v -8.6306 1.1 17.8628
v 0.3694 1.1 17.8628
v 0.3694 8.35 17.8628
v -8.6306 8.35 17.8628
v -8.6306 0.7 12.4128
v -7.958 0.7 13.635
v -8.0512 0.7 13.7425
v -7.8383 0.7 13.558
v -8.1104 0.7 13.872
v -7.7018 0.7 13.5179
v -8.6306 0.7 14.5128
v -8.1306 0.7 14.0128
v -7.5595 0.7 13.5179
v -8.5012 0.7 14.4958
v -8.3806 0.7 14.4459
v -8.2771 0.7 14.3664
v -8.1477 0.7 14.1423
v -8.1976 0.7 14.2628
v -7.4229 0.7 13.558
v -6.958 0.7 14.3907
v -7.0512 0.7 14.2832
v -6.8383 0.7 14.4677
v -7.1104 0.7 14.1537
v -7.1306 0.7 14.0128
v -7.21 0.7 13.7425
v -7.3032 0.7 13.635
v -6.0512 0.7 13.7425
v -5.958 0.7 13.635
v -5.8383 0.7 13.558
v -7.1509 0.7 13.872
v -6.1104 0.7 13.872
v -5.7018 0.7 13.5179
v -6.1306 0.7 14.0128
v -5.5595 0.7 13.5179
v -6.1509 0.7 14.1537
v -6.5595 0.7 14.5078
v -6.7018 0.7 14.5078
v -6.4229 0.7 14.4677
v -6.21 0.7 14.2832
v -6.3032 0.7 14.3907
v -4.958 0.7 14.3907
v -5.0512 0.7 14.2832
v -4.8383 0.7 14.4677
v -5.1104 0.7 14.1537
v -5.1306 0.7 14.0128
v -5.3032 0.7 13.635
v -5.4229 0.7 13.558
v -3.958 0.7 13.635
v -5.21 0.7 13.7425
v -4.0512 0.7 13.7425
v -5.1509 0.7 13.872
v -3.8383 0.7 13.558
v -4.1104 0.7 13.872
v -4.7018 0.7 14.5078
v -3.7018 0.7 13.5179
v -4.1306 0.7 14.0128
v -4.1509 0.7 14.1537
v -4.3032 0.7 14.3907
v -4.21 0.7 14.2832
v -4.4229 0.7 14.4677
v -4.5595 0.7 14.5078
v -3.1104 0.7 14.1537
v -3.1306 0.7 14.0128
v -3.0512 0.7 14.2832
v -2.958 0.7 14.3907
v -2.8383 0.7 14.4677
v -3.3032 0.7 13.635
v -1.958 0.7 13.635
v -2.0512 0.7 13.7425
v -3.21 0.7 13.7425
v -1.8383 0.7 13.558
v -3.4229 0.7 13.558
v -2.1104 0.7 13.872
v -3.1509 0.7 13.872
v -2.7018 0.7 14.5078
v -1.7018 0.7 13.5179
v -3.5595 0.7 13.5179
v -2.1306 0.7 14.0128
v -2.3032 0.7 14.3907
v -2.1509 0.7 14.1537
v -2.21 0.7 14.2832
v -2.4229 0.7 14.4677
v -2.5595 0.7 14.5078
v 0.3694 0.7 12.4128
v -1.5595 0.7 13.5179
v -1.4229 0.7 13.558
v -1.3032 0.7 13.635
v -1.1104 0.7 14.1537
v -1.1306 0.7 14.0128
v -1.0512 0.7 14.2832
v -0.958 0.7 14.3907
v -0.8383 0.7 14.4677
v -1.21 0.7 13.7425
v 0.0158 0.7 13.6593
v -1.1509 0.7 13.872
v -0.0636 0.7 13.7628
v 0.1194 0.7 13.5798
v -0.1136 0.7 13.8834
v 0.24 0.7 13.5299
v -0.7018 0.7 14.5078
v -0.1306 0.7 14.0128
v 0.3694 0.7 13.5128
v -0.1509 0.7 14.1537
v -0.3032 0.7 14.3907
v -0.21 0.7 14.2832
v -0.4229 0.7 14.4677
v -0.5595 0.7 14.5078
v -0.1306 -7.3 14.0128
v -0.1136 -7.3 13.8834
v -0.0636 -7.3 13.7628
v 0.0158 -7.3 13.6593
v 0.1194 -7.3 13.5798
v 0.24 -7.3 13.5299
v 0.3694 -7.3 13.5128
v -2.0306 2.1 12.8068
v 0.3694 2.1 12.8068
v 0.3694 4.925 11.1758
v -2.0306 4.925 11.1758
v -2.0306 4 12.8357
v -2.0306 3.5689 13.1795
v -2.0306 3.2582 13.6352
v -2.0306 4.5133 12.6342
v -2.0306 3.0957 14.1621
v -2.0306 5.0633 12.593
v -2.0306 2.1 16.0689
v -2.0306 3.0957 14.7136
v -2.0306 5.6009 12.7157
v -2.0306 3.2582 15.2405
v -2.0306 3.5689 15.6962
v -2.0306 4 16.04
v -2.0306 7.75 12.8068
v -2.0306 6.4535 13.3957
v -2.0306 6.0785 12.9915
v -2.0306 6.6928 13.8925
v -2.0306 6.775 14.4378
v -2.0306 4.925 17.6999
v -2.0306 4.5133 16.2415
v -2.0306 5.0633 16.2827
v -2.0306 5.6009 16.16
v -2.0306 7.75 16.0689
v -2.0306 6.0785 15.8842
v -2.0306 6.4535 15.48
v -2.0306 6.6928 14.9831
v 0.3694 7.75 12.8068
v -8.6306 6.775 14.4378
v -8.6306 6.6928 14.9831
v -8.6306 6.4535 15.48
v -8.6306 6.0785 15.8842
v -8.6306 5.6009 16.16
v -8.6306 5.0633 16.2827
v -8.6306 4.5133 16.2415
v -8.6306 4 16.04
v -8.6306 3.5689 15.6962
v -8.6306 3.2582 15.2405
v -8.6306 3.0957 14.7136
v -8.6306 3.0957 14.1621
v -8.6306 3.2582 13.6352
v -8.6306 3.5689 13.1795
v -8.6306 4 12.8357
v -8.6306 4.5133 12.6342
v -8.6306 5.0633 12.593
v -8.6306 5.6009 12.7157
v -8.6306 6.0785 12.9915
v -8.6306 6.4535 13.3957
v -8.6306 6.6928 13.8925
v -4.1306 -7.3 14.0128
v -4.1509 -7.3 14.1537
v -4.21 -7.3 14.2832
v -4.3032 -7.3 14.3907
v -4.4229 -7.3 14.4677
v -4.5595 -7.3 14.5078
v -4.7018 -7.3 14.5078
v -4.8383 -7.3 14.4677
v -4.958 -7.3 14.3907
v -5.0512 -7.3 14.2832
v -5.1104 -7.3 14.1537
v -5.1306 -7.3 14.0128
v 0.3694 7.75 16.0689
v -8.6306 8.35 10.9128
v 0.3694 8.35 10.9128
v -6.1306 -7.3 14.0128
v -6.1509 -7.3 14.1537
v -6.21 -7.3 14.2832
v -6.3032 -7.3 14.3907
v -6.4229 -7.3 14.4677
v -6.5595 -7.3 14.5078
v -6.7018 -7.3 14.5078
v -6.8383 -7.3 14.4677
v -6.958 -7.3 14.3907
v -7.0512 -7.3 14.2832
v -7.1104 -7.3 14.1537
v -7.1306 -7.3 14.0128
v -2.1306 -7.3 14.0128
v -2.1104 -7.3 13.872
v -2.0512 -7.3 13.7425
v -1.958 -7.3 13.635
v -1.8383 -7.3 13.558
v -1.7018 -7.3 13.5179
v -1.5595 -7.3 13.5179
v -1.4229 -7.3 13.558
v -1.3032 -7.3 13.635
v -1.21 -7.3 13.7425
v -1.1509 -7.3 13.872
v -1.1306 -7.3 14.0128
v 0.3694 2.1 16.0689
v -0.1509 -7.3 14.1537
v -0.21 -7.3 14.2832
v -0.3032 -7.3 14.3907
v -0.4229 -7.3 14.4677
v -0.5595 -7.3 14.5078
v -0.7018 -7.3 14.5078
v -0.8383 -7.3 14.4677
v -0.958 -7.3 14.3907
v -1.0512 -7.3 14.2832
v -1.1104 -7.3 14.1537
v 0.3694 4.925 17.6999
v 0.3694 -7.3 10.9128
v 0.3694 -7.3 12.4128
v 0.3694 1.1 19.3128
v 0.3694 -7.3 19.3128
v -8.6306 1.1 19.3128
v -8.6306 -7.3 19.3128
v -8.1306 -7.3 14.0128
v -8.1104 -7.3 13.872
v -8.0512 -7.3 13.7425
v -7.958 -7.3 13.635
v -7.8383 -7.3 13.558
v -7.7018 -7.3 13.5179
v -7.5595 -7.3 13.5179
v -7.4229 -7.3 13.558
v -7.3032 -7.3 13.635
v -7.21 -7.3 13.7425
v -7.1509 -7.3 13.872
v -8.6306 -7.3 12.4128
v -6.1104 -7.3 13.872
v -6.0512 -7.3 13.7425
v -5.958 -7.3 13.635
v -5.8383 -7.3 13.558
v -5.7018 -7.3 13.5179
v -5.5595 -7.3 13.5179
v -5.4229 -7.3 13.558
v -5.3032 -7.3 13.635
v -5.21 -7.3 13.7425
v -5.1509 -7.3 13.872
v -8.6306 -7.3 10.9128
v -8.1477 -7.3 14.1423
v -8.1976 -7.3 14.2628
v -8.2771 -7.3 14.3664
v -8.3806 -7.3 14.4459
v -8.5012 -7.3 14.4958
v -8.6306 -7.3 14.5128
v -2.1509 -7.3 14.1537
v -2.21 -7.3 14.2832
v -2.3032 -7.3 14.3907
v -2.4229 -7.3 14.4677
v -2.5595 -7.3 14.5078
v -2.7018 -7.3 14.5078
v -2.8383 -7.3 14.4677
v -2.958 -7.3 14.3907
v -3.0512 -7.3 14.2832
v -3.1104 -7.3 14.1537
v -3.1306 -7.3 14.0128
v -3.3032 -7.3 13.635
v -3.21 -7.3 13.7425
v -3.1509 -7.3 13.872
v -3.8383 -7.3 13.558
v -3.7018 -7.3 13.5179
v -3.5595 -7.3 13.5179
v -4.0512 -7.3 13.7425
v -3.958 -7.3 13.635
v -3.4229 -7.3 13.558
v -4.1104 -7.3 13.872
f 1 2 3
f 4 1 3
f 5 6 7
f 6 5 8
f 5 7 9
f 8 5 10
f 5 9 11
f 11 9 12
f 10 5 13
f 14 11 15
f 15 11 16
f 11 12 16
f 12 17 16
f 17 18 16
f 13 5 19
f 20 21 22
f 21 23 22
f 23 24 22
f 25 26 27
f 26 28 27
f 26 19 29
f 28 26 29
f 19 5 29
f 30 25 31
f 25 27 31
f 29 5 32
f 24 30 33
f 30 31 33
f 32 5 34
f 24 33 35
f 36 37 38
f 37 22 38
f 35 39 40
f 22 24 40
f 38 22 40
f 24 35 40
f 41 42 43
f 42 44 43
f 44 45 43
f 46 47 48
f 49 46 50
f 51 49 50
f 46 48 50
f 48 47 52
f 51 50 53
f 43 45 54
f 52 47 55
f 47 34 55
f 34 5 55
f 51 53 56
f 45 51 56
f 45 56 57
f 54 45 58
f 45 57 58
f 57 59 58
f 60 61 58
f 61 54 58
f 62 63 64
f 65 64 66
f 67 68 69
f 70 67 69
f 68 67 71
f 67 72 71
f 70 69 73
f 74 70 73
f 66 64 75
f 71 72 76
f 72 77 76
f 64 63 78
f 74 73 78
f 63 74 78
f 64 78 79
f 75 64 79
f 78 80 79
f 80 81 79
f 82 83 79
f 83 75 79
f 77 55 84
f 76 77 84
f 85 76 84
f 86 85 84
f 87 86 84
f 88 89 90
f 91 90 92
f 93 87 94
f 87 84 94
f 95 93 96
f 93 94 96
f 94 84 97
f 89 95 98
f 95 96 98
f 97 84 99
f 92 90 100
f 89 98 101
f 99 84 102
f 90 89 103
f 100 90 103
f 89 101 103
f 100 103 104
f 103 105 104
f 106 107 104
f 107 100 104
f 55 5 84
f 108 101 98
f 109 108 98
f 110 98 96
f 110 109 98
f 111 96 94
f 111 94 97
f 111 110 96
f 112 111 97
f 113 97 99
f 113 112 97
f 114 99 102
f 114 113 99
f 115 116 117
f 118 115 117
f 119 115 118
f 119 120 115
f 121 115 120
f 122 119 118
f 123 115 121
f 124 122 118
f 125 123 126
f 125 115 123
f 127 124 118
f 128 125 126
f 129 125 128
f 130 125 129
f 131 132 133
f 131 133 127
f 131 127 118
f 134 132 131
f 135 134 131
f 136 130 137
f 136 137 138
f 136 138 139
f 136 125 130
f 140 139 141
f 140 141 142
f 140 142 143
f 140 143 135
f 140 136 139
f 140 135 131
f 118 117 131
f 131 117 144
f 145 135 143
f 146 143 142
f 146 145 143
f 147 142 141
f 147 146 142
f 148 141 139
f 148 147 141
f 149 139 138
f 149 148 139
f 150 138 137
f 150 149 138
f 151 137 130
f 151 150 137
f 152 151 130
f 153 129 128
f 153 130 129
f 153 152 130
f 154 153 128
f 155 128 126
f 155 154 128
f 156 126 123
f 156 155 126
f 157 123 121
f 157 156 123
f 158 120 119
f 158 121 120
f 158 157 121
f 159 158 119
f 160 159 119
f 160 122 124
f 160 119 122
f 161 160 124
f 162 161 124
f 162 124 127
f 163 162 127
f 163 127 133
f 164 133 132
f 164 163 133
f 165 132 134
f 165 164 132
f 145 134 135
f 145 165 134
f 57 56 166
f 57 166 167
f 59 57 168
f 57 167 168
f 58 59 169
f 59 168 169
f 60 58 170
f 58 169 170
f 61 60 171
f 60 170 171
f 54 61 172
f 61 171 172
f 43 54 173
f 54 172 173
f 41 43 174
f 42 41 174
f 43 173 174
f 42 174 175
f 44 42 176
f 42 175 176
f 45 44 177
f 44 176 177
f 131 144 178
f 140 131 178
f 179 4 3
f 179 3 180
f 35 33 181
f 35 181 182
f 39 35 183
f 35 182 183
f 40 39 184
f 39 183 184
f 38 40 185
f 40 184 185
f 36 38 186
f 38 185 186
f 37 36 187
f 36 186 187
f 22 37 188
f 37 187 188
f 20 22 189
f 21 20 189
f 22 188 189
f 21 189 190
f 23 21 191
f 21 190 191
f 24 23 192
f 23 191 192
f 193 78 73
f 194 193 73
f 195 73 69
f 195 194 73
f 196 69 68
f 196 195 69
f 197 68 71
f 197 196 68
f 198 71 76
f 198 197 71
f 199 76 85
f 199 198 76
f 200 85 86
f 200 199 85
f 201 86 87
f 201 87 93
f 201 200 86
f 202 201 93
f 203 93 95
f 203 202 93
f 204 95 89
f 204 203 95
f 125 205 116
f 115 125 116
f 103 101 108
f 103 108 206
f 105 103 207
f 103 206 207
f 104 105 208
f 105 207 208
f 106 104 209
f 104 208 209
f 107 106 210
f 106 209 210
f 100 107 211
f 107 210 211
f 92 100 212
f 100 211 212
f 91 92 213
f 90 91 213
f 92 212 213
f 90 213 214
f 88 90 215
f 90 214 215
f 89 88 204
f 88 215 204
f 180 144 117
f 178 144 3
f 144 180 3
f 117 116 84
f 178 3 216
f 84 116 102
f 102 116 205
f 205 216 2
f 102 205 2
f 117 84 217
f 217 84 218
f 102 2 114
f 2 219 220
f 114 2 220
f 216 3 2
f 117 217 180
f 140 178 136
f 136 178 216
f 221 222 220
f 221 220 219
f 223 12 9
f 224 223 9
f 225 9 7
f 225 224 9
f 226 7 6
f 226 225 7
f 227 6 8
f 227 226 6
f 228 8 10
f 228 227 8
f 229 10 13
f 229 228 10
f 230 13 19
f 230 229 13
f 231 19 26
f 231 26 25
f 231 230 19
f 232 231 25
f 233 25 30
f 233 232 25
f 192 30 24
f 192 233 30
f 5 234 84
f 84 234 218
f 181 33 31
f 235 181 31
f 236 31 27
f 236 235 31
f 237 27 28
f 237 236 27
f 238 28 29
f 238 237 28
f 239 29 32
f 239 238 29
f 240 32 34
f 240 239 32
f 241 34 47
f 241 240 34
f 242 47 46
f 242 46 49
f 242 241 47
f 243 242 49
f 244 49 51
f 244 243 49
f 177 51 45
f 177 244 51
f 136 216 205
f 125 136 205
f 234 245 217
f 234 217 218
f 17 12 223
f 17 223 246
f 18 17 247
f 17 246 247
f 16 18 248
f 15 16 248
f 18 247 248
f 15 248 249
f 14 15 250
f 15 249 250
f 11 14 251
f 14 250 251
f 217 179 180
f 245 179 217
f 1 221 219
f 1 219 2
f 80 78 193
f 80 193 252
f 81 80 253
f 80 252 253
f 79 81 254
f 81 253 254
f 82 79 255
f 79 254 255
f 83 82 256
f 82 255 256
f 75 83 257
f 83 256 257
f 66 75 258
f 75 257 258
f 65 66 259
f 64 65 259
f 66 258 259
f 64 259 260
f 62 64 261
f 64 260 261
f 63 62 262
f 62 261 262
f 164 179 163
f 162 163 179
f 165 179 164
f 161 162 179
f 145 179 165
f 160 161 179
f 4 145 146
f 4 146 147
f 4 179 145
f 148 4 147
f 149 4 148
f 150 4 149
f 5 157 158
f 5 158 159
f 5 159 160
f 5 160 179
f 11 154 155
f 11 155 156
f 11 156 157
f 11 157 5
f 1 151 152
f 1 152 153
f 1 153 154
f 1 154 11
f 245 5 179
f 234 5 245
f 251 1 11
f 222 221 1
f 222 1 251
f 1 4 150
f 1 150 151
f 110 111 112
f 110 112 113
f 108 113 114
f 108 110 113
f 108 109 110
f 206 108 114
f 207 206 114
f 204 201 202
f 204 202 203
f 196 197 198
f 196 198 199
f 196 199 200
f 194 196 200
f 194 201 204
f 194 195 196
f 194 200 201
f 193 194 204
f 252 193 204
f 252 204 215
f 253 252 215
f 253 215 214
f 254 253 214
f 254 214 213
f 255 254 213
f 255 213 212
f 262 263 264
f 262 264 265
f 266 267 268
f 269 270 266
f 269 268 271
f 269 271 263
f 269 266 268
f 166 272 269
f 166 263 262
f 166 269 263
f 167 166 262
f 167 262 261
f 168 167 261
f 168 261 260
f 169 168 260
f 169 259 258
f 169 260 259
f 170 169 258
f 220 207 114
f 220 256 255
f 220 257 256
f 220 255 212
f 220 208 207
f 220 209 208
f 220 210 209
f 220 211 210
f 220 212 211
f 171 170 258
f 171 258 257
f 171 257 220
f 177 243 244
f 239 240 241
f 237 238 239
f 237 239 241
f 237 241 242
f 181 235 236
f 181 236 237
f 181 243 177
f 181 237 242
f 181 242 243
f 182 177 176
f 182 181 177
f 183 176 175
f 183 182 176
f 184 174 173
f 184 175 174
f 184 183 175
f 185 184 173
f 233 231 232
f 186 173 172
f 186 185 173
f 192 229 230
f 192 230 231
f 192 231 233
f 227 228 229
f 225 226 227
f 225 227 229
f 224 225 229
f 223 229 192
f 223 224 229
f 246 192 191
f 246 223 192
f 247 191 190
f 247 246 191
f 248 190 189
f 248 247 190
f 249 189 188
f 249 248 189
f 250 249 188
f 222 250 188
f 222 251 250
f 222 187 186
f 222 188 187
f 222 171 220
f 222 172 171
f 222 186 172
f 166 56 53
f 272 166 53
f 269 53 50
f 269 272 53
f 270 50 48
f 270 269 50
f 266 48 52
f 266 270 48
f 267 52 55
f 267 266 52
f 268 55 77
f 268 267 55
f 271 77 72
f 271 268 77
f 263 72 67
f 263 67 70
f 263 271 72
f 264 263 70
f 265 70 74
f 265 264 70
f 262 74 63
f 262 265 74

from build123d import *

# Parameters (mm, degrees)
SKETCH007_R     = 1.85
PAD003_DEPTH    = 9
POCKET003_DEPTH = 8
POCKET004_DEPTH = 2.4


with BuildPart() as part:
    # Sketch007 (on Face1 of ReferencePolarPattern) → Pad003 (new body)
    with BuildSketch(Plane.YZ.offset(-13.630613)):
        Polygon((-7.3, 19.312846), (1.1, 19.312846), (1.1, 17.862846), (8.35, 17.862846), (8.35, 10.912846), (-7.3, 10.912846), align=None)
        with Locations((4.925, 14.437846)):
            Circle(SKETCH007_R, mode=Mode.SUBTRACT)
    extrude(amount=PAD003_DEPTH)

    # Sketch008 (on Face6 of Pad003) → Pocket003 (cut)
    with BuildSketch(Plane(origin=(0, -7.3, 0), x_dir=(0, 0, -1), z_dir=(0, -1, 0))):
        with BuildLine():
            ThreePointArc((-14.012846, -13.130613), (-13.512846, -12.630613), (-14.012846, -12.130613))
            ThreePointArc((-14.012846, -11.130613), (-14.512846, -11.630613), (-14.012846, -12.130613))
            ThreePointArc((-14.012846, -11.130613), (-13.512846, -10.630613), (-14.012846, -10.130613))
            ThreePointArc((-14.012846, -9.130613), (-14.512846, -9.630613), (-14.012846, -10.130613))
            ThreePointArc((-14.012846, -9.130613), (-13.512846, -8.630613), (-14.012846, -8.130613))
            ThreePointArc((-14.012846, -7.130613), (-14.512846, -7.630613), (-14.012846, -8.130613))
            ThreePointArc((-14.012846, -7.130613), (-13.512846, -6.630613), (-14.012846, -6.130613))
            ThreePointArc((-14.012846, -5.130613), (-14.512846, -5.630613), (-14.012846, -6.130613))
            ThreePointArc((-14.012846, -5.130613), (-13.6592926094, -4.9841663906), (-13.512846, -4.630613))
            Line((-12.412846, -4.630613), (-13.512846, -4.630613))
            Line((-12.412846, -13.630613), (-12.412846, -4.630613))
            Line((-14.512846, -13.630613), (-12.412846, -13.630613))
            ThreePointArc((-14.012846, -13.130613), (-14.3663993906, -13.2770596094), (-14.512846, -13.630613))
        make_face()
    extrude(amount=-POCKET003_DEPTH, mode=Mode.SUBTRACT)

    # Sketch009 (on Face5 of Pocket003) → Pocket004 (cut)
    with BuildSketch(Plane.YZ.offset(-4.630613)):
        Polygon((7.75, 12.8068314895), (7.75, 16.0688605105), (4.925, 17.6998750209), (2.1, 16.0688605105), (2.1, 12.8068314895), (4.925, 11.1758169791), align=None)
    extrude(amount=-POCKET004_DEPTH, mode=Mode.SUBTRACT)


with BuildPart() as part_1:
    # Body001 placement: moved
    add(part.part.moved(Location((5, 0, 0))))


solid = part_1.part
